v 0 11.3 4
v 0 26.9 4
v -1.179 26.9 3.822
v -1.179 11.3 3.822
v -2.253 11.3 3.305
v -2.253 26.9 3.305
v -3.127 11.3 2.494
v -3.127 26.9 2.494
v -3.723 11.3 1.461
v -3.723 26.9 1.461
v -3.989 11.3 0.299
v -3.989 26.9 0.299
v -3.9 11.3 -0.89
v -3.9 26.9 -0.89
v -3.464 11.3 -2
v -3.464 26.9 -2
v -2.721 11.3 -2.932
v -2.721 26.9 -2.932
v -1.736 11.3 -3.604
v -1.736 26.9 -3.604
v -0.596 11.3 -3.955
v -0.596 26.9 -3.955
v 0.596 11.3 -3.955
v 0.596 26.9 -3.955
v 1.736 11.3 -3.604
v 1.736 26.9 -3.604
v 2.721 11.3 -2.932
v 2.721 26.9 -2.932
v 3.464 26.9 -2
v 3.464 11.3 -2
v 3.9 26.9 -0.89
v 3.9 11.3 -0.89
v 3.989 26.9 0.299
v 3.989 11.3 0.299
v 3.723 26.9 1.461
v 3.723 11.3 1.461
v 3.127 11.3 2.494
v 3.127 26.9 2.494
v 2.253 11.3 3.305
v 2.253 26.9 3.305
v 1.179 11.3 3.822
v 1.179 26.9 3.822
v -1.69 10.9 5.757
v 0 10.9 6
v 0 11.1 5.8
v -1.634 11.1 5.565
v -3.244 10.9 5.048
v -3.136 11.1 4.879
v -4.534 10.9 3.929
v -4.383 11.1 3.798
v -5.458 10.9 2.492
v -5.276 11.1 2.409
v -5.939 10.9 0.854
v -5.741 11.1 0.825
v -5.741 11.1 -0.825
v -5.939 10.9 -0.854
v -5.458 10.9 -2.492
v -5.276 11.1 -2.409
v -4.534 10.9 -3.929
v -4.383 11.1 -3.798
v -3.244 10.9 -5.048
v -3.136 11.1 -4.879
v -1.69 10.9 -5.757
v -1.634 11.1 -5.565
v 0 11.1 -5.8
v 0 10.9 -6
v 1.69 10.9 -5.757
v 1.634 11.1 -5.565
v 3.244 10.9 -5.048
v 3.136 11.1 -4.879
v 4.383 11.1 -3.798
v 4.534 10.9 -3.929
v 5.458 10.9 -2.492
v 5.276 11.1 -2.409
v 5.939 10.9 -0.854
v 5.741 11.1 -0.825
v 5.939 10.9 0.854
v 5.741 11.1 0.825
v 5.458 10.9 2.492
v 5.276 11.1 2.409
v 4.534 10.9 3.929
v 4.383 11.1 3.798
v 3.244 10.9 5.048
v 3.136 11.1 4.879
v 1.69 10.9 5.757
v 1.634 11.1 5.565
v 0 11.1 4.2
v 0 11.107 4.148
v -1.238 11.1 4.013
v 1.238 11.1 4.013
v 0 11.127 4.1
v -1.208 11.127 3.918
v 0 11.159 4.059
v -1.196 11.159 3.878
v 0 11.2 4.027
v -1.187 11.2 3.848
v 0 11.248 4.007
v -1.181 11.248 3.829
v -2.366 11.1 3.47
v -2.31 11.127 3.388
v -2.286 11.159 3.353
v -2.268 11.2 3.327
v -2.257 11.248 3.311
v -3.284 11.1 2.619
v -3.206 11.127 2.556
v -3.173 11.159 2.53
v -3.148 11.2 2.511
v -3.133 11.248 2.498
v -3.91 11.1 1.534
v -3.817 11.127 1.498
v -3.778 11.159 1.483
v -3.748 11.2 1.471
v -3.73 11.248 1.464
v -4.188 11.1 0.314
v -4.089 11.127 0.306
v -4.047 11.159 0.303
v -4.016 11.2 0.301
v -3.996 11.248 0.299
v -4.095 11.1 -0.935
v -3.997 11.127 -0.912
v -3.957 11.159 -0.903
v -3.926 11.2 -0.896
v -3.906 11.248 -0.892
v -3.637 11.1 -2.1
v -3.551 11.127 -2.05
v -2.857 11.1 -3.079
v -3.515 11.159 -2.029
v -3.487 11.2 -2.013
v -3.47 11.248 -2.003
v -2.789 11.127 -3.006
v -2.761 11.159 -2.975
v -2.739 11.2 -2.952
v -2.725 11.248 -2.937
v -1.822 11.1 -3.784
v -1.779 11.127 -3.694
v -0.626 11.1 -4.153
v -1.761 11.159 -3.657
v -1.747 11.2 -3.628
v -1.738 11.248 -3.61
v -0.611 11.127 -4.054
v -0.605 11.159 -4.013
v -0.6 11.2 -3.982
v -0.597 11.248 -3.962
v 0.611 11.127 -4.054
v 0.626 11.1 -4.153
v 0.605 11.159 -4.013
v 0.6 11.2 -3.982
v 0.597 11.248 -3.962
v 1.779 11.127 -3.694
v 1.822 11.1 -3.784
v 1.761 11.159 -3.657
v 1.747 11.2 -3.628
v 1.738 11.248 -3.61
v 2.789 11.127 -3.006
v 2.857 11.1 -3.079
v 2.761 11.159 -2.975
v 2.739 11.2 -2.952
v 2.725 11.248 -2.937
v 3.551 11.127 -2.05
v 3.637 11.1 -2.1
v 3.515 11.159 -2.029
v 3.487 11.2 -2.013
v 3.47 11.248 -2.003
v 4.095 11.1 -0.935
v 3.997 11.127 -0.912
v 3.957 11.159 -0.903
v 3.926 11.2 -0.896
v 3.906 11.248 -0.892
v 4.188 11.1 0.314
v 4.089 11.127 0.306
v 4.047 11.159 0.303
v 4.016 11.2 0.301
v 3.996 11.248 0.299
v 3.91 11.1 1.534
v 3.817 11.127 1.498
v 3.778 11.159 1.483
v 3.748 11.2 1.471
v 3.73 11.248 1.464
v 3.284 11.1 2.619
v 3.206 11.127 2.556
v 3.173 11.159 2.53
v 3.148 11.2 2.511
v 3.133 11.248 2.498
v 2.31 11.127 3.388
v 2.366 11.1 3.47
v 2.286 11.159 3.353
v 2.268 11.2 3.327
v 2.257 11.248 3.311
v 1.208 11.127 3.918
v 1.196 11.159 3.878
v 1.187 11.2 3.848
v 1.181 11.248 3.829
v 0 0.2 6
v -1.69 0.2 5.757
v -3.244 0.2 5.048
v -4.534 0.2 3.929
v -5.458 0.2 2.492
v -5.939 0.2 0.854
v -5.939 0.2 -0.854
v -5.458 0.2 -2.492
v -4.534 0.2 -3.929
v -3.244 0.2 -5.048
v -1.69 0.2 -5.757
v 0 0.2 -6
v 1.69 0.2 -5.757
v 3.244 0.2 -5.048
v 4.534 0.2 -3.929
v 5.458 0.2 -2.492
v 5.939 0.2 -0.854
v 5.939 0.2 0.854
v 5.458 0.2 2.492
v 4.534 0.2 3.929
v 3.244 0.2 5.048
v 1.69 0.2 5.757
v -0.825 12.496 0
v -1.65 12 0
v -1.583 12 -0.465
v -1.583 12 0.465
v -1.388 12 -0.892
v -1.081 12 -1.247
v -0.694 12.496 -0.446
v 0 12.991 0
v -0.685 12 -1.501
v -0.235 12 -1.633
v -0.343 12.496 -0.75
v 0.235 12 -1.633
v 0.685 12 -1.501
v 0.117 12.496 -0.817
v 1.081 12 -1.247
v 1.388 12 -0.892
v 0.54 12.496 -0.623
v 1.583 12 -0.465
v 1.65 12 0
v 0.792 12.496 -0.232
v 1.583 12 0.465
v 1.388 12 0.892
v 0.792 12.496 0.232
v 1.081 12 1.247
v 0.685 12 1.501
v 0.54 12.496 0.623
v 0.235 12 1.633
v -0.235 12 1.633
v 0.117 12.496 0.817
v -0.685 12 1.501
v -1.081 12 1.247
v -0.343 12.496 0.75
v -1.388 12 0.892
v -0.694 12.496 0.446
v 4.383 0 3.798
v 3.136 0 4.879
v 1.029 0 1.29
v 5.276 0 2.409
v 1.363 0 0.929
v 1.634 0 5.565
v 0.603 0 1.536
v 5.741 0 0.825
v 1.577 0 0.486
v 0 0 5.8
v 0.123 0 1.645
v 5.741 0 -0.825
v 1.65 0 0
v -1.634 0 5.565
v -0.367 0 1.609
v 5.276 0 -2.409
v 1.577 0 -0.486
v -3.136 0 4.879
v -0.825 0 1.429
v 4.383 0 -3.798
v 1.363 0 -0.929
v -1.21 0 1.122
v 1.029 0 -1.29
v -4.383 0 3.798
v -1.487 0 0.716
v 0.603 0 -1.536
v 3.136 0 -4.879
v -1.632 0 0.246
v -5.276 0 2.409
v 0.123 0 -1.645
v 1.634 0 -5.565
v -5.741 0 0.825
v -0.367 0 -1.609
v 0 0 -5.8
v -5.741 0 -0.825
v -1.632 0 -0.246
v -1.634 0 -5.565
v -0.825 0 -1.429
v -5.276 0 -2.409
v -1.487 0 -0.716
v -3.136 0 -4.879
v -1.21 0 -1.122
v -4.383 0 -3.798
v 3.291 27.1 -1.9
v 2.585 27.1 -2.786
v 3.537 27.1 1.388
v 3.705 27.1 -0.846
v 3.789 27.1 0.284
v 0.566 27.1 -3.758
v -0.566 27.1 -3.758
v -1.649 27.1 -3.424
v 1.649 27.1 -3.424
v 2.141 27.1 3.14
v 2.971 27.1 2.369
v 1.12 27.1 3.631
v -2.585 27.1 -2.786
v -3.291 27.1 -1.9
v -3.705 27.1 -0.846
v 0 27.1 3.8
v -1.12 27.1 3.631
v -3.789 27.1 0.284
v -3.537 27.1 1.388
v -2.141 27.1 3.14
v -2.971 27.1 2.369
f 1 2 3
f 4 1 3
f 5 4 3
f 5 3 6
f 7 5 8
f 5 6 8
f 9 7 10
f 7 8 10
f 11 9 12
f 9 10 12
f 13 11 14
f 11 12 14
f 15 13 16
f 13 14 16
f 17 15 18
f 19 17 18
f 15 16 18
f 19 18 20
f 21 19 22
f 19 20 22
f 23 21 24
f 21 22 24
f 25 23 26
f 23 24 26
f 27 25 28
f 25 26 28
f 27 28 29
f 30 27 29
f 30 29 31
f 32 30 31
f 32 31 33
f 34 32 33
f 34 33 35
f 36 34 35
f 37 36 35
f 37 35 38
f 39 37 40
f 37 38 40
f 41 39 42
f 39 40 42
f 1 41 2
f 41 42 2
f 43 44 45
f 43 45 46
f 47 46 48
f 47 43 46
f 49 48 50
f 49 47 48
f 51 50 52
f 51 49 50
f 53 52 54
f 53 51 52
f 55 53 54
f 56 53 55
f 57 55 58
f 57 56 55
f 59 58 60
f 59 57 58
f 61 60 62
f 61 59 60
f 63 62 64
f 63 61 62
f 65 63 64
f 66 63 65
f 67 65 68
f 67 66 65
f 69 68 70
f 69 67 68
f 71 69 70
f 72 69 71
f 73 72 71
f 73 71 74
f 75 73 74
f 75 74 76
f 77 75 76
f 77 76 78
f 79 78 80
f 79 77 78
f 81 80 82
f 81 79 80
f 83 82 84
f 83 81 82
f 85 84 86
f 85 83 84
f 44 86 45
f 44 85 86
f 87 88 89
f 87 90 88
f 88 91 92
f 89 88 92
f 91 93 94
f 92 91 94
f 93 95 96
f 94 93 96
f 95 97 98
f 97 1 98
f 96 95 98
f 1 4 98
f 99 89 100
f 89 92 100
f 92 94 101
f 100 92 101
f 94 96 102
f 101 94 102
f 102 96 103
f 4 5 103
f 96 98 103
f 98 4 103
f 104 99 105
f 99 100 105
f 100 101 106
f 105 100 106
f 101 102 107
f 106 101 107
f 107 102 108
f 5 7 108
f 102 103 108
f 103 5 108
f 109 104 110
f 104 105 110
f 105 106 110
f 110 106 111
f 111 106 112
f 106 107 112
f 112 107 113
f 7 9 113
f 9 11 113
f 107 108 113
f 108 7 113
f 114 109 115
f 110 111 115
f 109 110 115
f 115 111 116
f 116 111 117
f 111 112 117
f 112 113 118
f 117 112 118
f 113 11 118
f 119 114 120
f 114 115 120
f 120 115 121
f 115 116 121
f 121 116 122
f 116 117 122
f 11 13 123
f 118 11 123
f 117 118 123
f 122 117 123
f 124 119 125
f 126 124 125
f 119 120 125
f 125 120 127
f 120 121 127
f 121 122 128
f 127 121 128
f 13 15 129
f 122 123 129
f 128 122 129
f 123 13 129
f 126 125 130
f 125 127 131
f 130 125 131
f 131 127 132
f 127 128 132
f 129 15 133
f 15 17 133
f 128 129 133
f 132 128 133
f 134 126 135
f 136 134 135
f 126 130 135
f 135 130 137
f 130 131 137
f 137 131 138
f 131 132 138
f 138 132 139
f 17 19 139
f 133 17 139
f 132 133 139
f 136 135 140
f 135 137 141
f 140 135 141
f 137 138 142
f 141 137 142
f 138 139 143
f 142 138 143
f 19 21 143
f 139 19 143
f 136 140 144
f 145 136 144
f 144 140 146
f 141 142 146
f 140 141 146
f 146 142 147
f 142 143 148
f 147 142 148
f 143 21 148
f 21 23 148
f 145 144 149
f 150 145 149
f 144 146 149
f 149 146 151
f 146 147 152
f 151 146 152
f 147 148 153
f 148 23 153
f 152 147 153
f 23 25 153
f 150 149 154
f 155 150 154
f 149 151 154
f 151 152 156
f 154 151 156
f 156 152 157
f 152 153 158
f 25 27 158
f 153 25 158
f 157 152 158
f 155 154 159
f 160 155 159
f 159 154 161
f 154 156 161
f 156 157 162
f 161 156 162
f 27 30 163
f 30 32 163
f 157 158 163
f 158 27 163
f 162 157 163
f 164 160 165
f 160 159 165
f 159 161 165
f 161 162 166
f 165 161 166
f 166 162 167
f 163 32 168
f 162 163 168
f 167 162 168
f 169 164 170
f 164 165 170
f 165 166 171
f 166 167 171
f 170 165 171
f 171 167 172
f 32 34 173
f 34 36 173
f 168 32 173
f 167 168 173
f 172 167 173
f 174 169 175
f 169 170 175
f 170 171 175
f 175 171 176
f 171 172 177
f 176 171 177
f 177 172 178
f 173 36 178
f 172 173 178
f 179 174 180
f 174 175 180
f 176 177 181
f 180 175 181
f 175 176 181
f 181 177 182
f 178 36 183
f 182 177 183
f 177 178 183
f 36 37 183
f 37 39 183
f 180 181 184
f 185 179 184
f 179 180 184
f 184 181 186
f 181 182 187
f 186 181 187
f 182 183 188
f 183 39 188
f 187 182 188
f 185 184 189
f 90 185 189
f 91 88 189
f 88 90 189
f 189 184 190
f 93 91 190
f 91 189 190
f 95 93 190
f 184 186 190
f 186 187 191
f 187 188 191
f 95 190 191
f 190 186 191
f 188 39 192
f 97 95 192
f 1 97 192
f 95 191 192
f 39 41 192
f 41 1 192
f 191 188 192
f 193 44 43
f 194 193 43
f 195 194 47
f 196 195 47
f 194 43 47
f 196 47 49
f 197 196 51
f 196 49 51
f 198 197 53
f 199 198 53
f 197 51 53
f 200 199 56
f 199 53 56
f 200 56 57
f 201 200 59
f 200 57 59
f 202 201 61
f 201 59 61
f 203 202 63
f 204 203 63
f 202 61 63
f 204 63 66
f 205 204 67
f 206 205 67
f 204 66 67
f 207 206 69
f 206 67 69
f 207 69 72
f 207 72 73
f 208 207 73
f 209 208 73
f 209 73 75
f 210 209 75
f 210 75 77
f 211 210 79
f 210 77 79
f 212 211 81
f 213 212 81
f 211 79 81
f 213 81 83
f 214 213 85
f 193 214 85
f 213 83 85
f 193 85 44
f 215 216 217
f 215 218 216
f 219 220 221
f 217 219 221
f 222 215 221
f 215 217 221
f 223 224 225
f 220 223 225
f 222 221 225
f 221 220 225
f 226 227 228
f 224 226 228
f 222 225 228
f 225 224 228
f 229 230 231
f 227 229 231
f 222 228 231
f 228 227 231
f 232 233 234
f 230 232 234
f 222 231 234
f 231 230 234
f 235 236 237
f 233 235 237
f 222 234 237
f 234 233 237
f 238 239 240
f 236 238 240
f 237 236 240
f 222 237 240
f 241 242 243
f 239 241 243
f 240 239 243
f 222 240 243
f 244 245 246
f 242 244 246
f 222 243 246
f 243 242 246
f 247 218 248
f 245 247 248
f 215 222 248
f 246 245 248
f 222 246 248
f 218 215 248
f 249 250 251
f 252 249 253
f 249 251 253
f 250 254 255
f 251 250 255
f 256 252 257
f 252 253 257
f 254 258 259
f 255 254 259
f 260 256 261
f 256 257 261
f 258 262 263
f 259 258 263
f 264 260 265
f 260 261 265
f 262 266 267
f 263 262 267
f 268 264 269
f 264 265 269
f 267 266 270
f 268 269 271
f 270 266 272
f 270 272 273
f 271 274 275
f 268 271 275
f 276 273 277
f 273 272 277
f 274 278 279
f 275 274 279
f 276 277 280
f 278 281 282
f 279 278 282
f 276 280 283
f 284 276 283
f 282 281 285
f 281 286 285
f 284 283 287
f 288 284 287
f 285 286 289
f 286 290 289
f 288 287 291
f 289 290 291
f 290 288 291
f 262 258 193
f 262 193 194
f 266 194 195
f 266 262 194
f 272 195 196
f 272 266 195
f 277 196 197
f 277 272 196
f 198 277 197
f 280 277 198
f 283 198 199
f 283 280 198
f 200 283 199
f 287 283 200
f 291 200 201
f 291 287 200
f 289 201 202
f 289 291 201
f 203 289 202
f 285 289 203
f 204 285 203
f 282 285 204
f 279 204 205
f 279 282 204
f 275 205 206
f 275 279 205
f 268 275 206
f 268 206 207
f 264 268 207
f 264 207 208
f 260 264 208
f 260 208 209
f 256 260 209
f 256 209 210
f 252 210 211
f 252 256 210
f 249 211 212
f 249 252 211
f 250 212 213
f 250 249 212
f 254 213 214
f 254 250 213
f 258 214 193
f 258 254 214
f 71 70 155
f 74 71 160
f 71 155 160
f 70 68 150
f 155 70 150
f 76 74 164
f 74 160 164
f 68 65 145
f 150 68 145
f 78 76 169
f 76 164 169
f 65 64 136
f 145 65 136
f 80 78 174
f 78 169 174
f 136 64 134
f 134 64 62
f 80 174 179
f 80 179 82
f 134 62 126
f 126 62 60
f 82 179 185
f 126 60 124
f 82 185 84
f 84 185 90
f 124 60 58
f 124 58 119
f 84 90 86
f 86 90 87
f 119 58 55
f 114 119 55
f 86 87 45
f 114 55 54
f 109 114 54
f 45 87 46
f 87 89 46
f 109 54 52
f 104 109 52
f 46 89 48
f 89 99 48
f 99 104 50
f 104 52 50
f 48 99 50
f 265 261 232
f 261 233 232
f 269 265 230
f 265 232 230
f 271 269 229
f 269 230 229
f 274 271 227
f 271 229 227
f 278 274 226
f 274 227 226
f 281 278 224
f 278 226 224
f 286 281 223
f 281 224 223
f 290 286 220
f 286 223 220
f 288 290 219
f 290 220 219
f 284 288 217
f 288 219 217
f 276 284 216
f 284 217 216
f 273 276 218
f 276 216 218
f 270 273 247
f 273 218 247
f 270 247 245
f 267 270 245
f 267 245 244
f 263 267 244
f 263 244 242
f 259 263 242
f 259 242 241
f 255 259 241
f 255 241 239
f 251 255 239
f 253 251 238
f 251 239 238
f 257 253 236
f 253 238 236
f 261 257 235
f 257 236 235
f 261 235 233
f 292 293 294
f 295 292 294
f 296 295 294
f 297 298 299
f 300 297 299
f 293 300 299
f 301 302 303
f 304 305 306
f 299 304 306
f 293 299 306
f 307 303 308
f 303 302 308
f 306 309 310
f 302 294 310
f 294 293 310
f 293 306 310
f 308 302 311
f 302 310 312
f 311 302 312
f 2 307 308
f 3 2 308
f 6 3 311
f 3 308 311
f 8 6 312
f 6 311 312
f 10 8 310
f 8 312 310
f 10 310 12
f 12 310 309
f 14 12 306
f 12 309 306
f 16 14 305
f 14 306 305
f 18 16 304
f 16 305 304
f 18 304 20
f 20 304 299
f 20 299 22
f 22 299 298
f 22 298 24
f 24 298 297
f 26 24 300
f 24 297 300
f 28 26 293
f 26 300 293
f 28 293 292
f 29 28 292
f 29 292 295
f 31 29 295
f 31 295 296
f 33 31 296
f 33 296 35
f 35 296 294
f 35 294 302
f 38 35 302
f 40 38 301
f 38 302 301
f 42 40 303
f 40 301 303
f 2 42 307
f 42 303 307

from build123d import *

# Parameters (mm, degrees)
M4_TAPPED_HOLE1_D     = 3.3
M4_TAPPED_HOLE1_DEPTH = 12
M4_TAPPED_HOLE1_TIP   = 0.991420021
FILLET1_R             = 0.2
CHAMFER1_SIZE         = 0.2


with BuildPart() as part:
    # Sketch1 → Revolve1 (revolve)
    with BuildSketch(Plane.XY, mode=Mode.PRIVATE) as revolve1_sk:
        Polygon((0, 0), (6, 0), (6, 11.1), (4, 11.1), (4, 27.1), (0, 27.1), align=None)
    revolve(revolve1_sk.sketch.rotate(Axis((0, 7.476190476, 0), (0, -1, 0)), 90), axis=Axis((0, 7.476190476, 0), (0, -1, 0)))

    # M4 Tapped Hole1
    with Locations(Plane(origin=(0, 0, 0), x_dir=(-1, 0, 0), z_dir=(0, -1, 0))):
        with Locations((0, 0)):
            Hole(M4_TAPPED_HOLE1_D / 2, depth=M4_TAPPED_HOLE1_DEPTH)
            with Locations((0, 0, -(M4_TAPPED_HOLE1_DEPTH + M4_TAPPED_HOLE1_TIP / 2))):  # 118° drill point
                Cone(0, M4_TAPPED_HOLE1_D / 2, M4_TAPPED_HOLE1_TIP, mode=Mode.SUBTRACT)

    # Fillet1
    fillet1_edges = [part.edges().sort_by_distance(p)[0] for p in [
        (0, 11.1, -4),
    ]]
    fillet(fillet1_edges, radius=FILLET1_R)

    # Chamfer1
    chamfer1_edges = [part.edges().sort_by_distance(p)[0] for p in [
        (0, 27.1, -4),
        (0, 11.1, -6),
        (0, 0, -6),
    ]]
    chamfer(chamfer1_edges, length=CHAMFER1_SIZE)


solid = part.part
